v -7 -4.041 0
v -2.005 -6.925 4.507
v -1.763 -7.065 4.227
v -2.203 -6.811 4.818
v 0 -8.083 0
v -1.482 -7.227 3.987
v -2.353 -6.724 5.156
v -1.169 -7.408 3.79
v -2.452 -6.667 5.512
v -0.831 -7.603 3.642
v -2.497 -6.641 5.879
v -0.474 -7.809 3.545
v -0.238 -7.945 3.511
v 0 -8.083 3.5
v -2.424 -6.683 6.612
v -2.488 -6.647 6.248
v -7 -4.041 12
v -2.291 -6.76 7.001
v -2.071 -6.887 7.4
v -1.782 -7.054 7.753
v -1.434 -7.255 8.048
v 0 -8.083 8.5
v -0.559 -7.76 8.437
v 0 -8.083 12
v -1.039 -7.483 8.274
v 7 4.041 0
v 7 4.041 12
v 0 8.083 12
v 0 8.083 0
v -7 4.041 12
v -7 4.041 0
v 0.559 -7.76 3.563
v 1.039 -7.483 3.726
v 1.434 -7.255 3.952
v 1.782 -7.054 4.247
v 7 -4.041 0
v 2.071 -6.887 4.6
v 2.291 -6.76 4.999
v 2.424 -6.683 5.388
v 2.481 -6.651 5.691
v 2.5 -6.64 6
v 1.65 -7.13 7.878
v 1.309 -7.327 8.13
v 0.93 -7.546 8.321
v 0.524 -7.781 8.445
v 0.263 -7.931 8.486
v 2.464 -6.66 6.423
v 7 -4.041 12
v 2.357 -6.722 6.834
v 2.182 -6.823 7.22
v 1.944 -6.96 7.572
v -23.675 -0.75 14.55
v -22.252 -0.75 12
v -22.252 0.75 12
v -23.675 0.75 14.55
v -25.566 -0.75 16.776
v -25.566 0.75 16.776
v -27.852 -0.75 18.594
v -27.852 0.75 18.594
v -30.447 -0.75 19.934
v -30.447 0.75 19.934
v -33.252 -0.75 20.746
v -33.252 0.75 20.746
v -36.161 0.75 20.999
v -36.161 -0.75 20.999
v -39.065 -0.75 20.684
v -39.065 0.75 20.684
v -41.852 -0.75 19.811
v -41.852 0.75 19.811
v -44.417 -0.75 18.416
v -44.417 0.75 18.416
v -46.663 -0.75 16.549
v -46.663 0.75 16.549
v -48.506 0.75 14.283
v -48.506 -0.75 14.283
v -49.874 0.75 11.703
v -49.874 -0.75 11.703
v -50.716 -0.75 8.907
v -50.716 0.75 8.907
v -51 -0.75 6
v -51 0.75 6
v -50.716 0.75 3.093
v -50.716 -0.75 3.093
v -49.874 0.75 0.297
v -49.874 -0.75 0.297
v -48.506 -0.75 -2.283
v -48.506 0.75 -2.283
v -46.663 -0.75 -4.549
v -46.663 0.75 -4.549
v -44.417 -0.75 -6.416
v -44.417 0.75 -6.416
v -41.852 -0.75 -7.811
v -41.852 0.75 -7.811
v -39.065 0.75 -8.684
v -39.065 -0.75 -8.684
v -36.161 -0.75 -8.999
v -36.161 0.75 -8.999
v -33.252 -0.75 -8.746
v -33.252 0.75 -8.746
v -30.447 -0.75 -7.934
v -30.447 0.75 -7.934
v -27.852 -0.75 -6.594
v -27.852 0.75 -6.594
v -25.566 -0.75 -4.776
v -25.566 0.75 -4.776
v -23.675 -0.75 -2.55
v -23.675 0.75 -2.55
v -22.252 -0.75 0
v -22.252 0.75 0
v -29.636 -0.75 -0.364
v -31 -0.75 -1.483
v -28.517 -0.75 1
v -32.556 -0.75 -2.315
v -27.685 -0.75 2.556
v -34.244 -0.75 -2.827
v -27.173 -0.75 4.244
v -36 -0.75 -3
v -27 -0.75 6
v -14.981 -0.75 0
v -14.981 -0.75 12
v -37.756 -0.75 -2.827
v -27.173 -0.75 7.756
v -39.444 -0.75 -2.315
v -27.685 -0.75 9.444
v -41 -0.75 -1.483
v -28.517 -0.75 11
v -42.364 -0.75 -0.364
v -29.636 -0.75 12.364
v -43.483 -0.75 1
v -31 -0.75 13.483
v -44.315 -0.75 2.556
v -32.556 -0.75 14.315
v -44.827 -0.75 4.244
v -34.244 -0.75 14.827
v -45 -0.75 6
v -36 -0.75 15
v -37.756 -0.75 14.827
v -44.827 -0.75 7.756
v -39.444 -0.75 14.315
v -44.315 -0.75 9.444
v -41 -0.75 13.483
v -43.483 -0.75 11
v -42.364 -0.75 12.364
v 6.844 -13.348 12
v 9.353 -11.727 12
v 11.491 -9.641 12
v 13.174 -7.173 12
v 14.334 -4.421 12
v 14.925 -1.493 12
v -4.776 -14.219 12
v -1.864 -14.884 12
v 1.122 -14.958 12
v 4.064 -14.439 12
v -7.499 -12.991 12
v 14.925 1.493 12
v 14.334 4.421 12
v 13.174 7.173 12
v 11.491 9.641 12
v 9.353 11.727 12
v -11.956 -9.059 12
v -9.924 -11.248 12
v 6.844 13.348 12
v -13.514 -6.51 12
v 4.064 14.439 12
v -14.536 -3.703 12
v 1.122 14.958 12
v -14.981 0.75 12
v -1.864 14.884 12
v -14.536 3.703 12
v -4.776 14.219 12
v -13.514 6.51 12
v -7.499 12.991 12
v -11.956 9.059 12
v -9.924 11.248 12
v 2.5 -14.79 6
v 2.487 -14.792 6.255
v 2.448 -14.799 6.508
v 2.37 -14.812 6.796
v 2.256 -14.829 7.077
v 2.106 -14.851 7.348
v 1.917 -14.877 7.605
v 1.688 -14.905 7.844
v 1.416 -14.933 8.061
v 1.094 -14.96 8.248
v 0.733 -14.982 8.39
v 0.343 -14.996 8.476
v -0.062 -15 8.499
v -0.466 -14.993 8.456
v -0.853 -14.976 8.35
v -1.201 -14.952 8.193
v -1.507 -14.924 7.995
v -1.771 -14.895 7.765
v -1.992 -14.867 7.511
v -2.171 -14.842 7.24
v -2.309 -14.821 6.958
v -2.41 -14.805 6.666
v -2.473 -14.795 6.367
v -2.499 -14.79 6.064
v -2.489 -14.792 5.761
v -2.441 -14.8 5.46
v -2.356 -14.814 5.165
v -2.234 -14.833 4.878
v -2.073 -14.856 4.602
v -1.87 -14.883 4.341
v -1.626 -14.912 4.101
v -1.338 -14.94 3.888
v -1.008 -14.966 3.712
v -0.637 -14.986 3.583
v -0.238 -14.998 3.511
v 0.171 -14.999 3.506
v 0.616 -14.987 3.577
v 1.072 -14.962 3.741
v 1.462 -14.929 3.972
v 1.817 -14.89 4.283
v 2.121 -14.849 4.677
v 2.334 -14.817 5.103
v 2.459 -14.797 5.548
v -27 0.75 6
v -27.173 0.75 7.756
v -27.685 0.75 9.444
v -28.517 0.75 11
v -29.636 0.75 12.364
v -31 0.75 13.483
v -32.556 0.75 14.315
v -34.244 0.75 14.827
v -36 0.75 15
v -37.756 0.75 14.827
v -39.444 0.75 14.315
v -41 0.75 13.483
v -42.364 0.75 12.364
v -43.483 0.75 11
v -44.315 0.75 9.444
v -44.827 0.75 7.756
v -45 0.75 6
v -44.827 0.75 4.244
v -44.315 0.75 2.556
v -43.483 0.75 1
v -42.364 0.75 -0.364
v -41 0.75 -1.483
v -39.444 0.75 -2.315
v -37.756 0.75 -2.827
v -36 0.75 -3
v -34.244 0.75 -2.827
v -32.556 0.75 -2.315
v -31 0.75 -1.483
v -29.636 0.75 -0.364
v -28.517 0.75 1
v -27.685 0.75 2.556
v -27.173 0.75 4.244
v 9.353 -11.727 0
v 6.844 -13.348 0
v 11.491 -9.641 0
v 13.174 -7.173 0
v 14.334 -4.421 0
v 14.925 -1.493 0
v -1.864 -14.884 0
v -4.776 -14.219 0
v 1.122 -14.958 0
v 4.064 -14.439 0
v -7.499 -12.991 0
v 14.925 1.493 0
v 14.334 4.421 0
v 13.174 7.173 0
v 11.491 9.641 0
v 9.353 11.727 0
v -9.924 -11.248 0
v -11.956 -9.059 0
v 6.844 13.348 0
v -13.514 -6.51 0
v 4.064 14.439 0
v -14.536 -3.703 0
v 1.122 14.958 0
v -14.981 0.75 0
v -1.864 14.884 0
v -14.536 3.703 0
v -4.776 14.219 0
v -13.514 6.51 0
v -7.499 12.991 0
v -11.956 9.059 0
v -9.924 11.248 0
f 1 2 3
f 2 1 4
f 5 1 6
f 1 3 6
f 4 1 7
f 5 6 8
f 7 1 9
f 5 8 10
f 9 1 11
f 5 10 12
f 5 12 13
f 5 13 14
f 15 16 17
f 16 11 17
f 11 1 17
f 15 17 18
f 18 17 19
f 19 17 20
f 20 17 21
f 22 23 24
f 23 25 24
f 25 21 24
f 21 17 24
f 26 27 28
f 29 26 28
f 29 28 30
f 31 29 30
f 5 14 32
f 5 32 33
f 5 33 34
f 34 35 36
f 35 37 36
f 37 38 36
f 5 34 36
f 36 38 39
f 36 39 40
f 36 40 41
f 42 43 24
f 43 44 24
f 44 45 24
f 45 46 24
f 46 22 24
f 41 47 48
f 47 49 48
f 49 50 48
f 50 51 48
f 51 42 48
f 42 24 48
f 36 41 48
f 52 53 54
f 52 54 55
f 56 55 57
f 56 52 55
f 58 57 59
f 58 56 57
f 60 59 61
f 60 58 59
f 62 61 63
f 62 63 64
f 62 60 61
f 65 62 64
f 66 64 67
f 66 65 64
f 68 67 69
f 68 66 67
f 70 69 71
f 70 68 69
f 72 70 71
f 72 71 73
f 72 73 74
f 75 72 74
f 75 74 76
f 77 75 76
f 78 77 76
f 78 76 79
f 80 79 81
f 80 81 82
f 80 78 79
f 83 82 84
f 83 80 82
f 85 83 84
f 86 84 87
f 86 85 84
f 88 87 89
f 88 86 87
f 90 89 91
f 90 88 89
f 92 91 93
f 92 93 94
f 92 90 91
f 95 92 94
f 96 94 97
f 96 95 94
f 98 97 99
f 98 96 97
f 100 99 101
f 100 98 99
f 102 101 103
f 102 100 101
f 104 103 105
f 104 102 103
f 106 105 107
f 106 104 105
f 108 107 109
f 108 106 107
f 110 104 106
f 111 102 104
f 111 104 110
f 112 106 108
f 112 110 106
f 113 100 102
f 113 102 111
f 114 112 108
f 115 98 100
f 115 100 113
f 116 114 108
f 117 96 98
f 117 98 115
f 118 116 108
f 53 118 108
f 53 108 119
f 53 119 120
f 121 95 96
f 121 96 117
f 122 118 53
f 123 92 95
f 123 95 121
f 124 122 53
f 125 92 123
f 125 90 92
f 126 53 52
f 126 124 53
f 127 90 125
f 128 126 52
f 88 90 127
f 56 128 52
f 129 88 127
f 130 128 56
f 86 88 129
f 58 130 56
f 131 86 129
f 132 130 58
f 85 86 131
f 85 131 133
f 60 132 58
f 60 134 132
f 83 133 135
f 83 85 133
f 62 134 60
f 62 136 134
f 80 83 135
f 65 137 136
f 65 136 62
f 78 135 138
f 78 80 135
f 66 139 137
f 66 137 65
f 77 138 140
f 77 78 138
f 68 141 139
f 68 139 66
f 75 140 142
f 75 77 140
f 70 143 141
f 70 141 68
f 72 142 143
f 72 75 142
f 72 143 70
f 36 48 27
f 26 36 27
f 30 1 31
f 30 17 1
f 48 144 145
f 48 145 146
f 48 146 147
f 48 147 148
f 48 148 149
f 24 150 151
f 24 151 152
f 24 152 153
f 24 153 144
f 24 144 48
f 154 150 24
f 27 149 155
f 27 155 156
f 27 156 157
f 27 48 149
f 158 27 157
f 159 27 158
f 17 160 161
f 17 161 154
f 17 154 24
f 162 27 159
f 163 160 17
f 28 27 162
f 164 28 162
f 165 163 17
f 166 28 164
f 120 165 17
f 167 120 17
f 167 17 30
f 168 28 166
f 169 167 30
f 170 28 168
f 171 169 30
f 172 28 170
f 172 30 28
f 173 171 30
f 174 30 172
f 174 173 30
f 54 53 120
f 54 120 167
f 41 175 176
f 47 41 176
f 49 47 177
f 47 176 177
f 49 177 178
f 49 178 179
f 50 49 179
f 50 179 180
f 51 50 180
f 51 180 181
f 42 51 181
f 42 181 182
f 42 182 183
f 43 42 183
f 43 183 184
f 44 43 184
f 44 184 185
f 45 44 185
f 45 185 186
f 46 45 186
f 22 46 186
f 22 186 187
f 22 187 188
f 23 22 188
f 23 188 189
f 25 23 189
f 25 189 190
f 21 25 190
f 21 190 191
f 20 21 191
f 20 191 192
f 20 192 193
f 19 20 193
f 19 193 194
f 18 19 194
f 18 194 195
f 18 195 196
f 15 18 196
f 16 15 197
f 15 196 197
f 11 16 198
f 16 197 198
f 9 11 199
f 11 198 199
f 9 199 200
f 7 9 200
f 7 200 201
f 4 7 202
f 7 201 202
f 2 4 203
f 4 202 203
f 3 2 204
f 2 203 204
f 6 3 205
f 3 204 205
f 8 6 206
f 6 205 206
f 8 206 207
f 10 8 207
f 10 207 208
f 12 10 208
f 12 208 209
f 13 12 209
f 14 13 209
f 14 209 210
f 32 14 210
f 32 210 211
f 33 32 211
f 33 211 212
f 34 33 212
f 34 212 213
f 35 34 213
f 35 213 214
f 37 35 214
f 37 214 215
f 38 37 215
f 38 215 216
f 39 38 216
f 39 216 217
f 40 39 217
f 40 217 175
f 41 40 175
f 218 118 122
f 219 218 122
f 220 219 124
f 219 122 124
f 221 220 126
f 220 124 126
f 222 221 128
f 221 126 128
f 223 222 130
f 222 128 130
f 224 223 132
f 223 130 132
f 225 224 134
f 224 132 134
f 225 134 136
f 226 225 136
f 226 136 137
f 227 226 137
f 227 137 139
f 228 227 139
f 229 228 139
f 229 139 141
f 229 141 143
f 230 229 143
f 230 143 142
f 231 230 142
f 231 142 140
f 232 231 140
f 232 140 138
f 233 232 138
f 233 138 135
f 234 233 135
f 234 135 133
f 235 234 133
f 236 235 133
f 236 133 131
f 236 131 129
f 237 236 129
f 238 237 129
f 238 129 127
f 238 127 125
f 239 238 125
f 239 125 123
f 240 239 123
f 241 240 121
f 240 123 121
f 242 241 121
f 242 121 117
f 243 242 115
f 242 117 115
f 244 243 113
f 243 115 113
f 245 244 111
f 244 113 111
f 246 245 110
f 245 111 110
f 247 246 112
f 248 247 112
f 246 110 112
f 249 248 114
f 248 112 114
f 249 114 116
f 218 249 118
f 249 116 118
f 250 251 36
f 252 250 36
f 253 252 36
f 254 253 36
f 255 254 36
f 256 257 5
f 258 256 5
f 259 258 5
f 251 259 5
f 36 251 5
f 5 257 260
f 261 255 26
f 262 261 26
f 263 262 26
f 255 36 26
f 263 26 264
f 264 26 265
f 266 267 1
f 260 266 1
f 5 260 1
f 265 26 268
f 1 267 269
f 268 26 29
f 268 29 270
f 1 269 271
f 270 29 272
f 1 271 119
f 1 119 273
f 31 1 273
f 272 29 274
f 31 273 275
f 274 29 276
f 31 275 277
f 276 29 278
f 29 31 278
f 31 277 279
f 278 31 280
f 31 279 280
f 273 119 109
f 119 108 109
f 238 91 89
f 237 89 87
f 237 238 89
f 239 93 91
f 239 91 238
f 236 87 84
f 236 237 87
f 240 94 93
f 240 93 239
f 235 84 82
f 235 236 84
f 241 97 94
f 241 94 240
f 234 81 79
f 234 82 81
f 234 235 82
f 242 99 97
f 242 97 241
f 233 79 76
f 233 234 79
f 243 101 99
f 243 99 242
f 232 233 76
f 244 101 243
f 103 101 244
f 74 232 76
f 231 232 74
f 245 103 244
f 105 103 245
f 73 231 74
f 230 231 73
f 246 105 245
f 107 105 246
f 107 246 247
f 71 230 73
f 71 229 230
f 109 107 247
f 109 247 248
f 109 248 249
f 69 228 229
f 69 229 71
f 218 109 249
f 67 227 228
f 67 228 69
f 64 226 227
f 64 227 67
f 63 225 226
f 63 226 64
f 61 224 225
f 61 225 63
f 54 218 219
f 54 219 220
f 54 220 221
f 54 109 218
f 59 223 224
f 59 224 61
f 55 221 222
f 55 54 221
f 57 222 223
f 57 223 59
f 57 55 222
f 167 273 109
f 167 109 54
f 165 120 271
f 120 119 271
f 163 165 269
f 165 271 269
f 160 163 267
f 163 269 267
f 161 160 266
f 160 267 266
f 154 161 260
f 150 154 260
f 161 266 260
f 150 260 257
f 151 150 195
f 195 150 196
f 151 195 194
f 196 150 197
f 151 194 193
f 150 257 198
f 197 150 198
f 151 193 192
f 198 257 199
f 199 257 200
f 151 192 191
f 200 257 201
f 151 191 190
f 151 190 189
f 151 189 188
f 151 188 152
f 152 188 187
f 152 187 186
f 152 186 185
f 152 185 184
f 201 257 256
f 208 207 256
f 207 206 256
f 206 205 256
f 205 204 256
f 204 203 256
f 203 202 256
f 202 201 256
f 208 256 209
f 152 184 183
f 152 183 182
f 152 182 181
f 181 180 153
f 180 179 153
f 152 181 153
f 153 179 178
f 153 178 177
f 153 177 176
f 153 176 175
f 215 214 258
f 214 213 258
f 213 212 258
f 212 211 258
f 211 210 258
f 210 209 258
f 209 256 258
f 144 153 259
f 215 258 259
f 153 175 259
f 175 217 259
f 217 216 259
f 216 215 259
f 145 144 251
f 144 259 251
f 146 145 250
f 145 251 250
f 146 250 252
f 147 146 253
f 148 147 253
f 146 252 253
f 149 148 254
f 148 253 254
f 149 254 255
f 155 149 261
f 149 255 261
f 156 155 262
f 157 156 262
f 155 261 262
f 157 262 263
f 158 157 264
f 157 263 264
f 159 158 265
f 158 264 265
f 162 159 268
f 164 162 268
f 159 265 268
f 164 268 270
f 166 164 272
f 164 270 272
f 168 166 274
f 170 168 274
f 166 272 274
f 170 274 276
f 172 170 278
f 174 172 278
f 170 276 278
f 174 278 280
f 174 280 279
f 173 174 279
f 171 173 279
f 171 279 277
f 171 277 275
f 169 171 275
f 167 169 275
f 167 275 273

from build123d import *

# Parameters (mm, degrees)
F0_R      = 15
F1_DEPTH  = 12
F3_DEPTH  = 12.001
F4_R      = 15
F5_DEPTH  = 0.75
F6_R      = 9
F7_DEPTH  = 15.751
F9_R      = 2.5
F10_DEPTH = 12
F11_W     = 1.5
F11_H     = 12
F12_REACH = 42.0943866224
F13_W     = 1.5
F13_H     = 12
F14_DEPTH = 8


with BuildPart() as f1:
    # F0 (on Top) → F1 (new body)
    with BuildSketch(Plane.XY):
        Circle(F0_R)
    extrude(amount=F1_DEPTH)

    # F2 (on face) → F3 (cut, through all)
    with BuildSketch(Plane.XY.offset(12)):
        Polygon((7, -4.0414518843), (7, 4.0414518843), (0, 8.0829037687), (-7, 4.0414518843), (-7, -4.0414518843), (0, -8.0829037687), align=None)
    extrude(amount=-F3_DEPTH, mode=Mode.SUBTRACT)

    # F9 (on offset) → F10 (cut)
    with BuildSketch(Plane.XZ.offset(15)):
        with Locations((0, 6)):
            Circle(F9_R)
    extrude(amount=-F10_DEPTH, mode=Mode.SUBTRACT)



with BuildPart() as f5:
    # F4 (on Front) → F5 (new body, symmetric)
    with BuildSketch(Plane.XZ):
        with Locations((-36, 6)):
            Circle(F4_R)
    extrude(amount=F5_DEPTH, both=True)

    # F6 (on face) → F7 (cut, through all)
    with BuildSketch(Plane.XZ.offset(0.75)):
        with Locations((-36, 6)):
            Circle(F6_R)
    extrude(amount=-F7_DEPTH, mode=Mode.SUBTRACT)



with BuildPart() as f5b:
    # F4 (on Front) → F5, piece 2 (new body, symmetric)
    with BuildSketch(Plane.XZ):
        Polygon((-21, 0), (-15, 0), (-15, 12), (-21, 12), (-21, 6), align=None)
    extrude(amount=F5_DEPTH, both=True)


with BuildPart() as f5_1:
    add(f5.part)

    add(f5b.part)  # F12 merges F5b
    f12_end = f5_1.faces().sort_by_distance((-45, 0, 6))[0]
    # F11 (on face) → F12 (join, up to a face of the model that its end follows)
    with BuildSketch(Plane(origin=(-21, 0, 0), x_dir=(0, -1, 0), z_dir=(-1, 0, 0))):
        with Locations((0, 6)):
            Rectangle(F11_W, F11_H)
    f12_long = extrude(amount=F12_REACH, mode=Mode.PRIVATE)
    add(split(f12_long, bisect_by=f12_end, keep=Keep.ALL, mode=Mode.PRIVATE).solids().sort_by_distance((-21, 0, 6))[0])


with BuildPart() as f1_1:
    add(f1.part)

    add(f5_1.part)  # F14 merges F5
    # F13 (on face) → F14 (join, through all)
    with BuildSketch(Plane.YZ.offset(-15)):
        with Locations((0, 6)):
            Rectangle(F13_W, F13_H)
    extrude(amount=F14_DEPTH)


solid = f1_1.part
